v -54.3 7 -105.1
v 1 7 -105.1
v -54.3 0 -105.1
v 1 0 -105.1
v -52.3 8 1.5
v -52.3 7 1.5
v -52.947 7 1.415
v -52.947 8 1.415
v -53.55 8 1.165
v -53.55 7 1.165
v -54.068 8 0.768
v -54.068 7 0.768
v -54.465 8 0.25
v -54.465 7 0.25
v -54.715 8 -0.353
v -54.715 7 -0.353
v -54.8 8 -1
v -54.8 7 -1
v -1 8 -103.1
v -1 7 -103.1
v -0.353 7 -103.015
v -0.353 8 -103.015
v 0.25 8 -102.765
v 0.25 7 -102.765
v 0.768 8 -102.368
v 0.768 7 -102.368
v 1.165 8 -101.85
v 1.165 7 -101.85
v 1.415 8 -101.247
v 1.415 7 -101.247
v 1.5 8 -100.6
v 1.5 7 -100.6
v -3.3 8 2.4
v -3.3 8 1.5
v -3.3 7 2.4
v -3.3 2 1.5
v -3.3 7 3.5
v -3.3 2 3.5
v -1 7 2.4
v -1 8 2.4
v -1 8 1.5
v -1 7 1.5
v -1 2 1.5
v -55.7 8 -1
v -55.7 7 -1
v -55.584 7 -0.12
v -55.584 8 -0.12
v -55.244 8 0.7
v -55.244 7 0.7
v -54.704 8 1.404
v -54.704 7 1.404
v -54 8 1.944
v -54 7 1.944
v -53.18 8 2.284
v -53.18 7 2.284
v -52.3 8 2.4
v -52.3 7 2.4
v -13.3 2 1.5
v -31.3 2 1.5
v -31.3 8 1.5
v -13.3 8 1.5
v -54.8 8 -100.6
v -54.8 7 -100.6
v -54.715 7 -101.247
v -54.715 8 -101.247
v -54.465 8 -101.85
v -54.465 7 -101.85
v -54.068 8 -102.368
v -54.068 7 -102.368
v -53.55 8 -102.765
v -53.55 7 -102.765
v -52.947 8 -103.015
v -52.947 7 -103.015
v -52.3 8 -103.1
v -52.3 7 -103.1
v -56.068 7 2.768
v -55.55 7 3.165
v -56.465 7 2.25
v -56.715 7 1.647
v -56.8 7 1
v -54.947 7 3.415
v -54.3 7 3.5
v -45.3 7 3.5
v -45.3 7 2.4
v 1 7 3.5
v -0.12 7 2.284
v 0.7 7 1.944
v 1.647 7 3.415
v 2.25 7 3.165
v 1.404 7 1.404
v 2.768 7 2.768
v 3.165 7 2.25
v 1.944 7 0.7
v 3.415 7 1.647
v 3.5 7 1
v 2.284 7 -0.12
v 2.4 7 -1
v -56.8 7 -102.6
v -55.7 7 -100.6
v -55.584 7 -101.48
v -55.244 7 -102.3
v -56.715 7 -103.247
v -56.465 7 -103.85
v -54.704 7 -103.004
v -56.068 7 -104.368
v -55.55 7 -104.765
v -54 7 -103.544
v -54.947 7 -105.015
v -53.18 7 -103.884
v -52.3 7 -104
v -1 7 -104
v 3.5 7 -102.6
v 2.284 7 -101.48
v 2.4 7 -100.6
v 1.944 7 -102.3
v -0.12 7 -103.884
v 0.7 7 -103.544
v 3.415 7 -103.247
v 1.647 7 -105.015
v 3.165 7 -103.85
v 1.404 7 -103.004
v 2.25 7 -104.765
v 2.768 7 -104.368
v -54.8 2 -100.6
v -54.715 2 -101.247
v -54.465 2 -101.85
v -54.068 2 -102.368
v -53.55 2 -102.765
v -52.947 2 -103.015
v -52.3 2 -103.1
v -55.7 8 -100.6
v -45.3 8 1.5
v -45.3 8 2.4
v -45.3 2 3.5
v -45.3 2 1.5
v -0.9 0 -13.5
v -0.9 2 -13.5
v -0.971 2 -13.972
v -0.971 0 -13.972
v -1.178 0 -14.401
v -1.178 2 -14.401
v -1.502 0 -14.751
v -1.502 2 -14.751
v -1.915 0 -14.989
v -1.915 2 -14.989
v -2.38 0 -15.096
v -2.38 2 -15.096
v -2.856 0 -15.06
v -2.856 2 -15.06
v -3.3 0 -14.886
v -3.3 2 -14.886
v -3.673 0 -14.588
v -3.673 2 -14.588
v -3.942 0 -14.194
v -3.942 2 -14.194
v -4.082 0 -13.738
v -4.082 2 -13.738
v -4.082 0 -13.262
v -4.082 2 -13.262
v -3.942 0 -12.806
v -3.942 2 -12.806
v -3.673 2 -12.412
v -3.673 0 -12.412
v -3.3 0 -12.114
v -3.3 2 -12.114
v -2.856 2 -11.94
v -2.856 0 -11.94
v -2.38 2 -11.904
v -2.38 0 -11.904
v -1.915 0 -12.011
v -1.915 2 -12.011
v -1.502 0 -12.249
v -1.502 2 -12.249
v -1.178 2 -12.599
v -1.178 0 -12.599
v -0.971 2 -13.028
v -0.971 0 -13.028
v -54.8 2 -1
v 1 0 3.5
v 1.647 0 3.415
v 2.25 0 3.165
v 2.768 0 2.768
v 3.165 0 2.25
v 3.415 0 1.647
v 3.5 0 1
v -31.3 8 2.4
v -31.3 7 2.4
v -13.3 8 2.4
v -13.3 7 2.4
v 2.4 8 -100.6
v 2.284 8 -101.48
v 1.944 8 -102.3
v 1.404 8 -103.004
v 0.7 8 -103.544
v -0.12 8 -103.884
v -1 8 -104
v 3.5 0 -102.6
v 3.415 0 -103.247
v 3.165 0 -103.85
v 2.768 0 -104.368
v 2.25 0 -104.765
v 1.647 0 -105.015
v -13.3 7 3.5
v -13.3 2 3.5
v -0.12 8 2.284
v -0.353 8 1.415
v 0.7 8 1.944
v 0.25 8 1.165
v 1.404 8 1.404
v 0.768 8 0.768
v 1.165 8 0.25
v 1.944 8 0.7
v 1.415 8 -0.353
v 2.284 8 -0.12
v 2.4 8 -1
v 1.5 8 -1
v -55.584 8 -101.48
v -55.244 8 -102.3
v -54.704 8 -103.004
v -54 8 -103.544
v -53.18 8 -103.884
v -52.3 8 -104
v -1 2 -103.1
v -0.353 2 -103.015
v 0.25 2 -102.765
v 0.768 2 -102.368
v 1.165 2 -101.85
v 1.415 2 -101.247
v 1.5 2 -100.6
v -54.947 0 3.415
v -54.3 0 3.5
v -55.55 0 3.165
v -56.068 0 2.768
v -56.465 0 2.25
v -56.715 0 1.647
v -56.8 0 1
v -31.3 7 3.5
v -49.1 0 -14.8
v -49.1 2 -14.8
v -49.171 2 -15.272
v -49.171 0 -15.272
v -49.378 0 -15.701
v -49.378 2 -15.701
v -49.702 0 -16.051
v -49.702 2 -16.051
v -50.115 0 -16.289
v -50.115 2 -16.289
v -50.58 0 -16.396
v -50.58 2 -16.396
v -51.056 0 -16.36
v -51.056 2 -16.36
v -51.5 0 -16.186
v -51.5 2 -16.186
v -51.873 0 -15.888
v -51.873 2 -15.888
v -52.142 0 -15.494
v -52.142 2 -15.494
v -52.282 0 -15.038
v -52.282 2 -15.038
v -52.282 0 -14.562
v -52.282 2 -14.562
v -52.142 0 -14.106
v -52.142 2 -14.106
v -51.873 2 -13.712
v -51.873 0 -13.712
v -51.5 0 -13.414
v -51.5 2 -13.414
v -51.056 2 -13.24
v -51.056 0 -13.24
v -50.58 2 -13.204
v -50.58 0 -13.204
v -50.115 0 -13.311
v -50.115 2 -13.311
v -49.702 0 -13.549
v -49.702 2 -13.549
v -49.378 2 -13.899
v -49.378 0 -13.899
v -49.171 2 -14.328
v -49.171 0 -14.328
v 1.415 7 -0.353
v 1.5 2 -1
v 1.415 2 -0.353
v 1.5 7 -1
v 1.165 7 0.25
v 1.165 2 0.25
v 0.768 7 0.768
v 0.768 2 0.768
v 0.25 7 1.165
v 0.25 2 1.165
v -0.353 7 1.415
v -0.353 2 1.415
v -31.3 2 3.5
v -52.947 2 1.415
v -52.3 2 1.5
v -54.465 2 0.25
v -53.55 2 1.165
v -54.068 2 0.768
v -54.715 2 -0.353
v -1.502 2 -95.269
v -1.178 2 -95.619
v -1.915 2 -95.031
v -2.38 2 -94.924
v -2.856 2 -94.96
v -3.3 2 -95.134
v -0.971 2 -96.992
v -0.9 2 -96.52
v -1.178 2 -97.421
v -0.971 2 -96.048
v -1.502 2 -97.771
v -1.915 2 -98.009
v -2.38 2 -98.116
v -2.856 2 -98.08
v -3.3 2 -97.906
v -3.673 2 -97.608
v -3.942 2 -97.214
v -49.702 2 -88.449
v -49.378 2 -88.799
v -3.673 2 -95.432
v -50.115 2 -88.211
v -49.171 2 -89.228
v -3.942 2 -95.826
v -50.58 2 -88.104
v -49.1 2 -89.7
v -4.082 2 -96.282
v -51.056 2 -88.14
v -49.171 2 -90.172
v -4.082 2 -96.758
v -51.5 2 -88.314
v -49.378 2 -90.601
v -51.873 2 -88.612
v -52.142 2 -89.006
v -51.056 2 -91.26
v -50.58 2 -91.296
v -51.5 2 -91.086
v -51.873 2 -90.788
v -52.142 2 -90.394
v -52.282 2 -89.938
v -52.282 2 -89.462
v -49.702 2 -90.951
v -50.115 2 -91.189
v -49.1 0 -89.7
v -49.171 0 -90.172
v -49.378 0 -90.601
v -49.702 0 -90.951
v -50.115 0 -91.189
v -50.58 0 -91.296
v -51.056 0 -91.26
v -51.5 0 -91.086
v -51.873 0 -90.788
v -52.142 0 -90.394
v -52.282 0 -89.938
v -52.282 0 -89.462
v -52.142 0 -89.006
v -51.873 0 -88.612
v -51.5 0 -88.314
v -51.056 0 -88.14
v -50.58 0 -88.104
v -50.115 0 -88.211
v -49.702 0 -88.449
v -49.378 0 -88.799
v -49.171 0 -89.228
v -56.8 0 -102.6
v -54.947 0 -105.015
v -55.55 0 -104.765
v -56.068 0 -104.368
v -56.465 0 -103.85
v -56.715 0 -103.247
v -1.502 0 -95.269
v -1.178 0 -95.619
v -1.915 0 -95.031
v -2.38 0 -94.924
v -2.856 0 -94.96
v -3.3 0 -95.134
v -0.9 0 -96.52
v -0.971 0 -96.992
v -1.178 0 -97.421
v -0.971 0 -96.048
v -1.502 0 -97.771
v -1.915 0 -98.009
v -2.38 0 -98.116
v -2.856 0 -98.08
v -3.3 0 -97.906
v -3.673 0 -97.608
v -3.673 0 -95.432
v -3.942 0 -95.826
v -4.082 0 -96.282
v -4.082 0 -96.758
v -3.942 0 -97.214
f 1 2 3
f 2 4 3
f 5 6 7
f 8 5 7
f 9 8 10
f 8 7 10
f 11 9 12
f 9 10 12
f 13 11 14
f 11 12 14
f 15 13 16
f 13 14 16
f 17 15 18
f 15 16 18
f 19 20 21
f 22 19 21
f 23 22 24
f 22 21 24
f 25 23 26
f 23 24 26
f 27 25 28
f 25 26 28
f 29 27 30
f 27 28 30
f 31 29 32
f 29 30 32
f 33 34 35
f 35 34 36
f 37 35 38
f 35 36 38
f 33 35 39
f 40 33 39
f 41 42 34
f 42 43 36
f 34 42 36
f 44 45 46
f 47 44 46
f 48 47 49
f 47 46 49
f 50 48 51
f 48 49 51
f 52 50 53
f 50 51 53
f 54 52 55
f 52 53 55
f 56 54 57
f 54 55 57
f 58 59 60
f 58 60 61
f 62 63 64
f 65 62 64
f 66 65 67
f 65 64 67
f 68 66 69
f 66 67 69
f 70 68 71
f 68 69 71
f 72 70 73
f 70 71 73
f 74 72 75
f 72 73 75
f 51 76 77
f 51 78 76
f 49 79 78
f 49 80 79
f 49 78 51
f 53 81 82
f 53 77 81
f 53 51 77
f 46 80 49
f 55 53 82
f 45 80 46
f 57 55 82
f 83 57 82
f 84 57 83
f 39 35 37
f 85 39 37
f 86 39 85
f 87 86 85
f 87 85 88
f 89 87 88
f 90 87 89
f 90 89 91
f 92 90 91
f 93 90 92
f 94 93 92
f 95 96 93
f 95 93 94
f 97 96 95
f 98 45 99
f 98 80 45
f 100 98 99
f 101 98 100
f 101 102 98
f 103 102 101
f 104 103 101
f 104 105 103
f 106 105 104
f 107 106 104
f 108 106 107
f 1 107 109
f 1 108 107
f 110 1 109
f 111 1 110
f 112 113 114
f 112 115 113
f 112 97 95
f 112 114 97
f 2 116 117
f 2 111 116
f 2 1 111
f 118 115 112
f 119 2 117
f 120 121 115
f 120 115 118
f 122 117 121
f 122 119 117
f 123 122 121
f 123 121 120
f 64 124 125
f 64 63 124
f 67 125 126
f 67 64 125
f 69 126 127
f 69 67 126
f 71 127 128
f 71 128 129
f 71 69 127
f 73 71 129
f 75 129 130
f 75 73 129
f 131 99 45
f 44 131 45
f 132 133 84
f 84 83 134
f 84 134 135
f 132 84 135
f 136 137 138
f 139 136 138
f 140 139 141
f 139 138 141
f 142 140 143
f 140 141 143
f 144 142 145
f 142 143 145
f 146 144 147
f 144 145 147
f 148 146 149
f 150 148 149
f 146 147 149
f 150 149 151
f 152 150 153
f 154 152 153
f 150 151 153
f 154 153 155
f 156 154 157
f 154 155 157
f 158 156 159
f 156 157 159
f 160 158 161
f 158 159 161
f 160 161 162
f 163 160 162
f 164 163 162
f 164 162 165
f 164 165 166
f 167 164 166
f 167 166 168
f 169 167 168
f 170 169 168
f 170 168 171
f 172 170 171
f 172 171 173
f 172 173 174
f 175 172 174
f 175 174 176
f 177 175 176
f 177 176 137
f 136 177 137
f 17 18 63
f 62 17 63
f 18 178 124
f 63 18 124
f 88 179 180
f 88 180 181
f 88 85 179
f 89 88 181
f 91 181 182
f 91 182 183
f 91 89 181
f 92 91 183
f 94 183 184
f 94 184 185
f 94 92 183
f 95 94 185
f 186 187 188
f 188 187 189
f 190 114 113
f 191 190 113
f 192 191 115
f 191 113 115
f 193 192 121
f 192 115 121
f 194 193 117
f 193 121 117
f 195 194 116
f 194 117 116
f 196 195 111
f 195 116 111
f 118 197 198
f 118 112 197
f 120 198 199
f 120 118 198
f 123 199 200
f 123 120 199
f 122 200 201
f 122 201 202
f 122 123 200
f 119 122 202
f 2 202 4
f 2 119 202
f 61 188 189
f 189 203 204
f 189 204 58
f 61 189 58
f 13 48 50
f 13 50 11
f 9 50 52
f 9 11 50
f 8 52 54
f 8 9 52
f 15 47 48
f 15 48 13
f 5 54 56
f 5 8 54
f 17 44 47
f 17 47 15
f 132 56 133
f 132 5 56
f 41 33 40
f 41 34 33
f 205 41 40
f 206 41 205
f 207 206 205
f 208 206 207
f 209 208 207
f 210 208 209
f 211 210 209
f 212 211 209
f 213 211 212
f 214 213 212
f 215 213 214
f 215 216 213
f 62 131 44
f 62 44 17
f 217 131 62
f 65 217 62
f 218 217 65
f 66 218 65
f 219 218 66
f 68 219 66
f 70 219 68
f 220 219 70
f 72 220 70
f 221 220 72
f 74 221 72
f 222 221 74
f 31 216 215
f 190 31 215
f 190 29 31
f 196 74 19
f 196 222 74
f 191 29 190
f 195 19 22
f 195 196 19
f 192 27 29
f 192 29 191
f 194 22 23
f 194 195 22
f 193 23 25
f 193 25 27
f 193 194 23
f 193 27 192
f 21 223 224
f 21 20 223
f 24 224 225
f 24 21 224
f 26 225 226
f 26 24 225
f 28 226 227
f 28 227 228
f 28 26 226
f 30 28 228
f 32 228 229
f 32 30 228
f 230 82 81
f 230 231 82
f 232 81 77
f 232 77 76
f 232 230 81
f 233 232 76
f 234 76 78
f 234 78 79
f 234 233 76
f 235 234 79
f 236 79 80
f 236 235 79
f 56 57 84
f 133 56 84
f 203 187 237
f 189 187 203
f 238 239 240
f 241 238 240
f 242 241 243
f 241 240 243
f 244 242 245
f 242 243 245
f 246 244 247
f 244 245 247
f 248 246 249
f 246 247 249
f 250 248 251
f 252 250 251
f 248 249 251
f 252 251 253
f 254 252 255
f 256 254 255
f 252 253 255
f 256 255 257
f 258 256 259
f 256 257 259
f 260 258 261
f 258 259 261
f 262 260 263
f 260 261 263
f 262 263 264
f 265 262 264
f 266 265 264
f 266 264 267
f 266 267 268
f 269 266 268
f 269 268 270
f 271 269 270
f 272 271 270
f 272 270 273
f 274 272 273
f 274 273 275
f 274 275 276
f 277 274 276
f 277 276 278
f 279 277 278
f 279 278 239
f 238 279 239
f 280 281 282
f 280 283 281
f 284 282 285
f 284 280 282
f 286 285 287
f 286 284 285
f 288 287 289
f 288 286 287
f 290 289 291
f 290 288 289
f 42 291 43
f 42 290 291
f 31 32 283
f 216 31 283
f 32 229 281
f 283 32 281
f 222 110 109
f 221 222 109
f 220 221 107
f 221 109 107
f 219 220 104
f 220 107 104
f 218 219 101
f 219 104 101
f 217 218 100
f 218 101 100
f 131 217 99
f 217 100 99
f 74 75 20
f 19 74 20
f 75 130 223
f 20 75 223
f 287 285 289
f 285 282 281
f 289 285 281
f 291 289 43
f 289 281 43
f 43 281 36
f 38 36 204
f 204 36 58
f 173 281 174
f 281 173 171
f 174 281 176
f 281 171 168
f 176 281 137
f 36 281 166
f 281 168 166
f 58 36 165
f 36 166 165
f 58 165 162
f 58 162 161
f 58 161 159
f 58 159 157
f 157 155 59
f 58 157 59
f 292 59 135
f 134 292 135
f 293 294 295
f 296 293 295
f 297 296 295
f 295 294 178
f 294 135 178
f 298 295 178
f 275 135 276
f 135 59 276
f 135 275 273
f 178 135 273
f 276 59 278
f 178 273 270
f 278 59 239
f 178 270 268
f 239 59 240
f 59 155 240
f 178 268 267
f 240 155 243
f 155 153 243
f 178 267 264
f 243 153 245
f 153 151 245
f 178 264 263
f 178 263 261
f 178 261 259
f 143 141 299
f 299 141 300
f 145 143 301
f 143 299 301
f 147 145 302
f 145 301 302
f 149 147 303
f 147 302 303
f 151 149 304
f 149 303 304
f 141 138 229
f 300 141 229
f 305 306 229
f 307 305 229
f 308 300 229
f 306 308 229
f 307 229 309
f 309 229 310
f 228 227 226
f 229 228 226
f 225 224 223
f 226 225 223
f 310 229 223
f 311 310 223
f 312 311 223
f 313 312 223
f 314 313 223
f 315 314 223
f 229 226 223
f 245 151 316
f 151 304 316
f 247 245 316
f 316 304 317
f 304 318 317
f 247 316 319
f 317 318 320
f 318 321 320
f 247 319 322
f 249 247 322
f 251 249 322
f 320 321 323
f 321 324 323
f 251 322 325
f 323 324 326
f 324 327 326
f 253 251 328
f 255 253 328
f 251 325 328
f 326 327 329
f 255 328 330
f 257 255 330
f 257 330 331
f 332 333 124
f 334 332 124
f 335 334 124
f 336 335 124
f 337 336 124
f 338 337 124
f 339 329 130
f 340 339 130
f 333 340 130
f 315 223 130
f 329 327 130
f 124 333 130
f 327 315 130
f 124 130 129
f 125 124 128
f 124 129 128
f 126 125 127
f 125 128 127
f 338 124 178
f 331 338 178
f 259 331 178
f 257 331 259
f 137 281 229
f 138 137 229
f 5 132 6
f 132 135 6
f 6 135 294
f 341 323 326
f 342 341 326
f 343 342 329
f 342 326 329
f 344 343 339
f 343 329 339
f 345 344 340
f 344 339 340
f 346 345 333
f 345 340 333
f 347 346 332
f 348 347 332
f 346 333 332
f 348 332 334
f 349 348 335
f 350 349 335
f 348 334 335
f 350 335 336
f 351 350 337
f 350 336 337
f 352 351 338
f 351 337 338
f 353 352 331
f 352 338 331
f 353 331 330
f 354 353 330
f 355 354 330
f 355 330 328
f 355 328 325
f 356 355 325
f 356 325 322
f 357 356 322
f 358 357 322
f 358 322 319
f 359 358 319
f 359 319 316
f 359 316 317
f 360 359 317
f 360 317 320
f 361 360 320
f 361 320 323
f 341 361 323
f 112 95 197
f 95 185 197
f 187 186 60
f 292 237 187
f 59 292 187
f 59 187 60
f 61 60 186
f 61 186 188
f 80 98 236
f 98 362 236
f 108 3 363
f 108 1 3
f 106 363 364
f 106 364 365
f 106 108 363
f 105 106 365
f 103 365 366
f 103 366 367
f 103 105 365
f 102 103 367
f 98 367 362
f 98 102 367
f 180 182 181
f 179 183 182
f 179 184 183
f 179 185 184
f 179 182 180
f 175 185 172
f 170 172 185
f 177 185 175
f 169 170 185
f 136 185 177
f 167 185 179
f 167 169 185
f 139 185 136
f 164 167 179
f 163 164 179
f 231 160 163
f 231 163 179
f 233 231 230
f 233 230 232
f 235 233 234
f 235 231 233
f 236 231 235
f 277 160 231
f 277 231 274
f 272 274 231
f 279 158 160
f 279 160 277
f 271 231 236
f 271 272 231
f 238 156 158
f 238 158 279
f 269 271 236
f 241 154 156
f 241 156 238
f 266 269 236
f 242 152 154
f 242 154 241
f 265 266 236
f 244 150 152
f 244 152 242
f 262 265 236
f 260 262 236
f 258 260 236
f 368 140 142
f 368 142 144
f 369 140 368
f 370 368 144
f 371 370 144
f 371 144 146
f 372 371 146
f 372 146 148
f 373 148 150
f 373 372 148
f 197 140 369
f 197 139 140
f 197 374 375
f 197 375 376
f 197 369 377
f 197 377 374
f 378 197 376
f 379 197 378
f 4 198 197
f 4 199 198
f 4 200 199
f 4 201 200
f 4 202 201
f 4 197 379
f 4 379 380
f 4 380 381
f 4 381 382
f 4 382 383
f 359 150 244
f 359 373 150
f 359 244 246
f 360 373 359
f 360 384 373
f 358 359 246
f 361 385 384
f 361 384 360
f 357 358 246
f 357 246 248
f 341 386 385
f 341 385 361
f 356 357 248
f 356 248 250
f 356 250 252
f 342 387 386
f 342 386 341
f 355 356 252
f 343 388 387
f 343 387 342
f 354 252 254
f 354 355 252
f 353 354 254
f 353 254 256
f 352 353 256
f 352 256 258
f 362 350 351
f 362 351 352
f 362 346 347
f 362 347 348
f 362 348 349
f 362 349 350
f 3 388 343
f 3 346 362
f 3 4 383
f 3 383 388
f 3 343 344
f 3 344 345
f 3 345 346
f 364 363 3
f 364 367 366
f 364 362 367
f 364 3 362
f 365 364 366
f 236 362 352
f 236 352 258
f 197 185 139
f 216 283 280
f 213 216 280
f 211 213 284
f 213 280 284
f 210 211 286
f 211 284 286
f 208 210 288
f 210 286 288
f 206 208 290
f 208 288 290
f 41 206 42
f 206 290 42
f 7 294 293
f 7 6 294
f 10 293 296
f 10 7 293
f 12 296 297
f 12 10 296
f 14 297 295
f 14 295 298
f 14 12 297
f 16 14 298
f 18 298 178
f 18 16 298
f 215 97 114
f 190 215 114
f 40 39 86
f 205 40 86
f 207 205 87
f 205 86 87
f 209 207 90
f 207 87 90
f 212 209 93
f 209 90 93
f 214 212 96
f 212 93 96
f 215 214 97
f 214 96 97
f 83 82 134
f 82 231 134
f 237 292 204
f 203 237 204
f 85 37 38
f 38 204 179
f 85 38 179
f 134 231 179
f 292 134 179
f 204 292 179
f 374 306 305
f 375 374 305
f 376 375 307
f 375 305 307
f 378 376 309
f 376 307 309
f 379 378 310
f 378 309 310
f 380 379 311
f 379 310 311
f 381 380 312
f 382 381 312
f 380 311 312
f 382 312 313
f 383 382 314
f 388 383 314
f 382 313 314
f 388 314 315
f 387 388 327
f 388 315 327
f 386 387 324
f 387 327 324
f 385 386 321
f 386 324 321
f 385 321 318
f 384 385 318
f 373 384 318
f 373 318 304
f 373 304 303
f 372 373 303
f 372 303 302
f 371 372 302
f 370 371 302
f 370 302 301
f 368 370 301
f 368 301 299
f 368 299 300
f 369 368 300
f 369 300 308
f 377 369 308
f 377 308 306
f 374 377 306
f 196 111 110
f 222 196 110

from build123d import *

# Parameters (mm, degrees)
BOSS_EXTRUDE1_DEPTH = 2
SKETCH5_W           = 18
SKETCH5_H           = 2
BOSS_EXTRUDE2_DEPTH = 5
CUT_EXTRUDE1_REACH  = 4
SKETCH6_R           = 1.6
FILLET1_R           = 2.5
SKETCH7_W           = 18
SKETCH7_H           = 0.9
BOSS_EXTRUDE3_DEPTH = 1


with BuildPart() as part:
    # Sketch4 → Boss-Extrude1 (new body)
    with BuildSketch(Plane(origin=(0, 0, 0), x_dir=(1, 0, 0), z_dir=(0, 1, 0))):
        Polygon((-56.8, -3.5), (-56.8, 105.1), (3.5, 105.1), (3.5, -3.5), (-2.3, -3.5), (-14.3, -3.5), (-30.8, -3.5), (-45.8, -3.5), align=None)
    extrude(amount=BOSS_EXTRUDE1_DEPTH)

    # Sketch5 → Boss-Extrude2 (add)
    with BuildSketch(Plane(origin=(0, 2, 0), x_dir=(1, 0, 0), z_dir=(0, 1, 0))):
        Polygon((-45.3, -1.5), (-54.8, -1.5), (-54.8, 103.1), (1.5, 103.1), (1.5, -1.5), (-3.3, -1.5), (-3.3, -3.5), (3.5, -3.5), (3.5, 105.1), (-56.8, 105.1), (-56.8, -3.5), (-45.3, -3.5), align=None)
        with Locations((-22.3, -2.5)):
            Rectangle(SKETCH5_W, SKETCH5_H)
    extrude(amount=BOSS_EXTRUDE2_DEPTH)

    # Sketch6 → Cut-Extrude1 (cut, up to next)
    with BuildSketch(Plane(origin=(0, 2, 0), x_dir=(1, 0, 0), z_dir=(0, 1, 0)), mode=Mode.PRIVATE) as cut_extrude1_sk1:
        with Locations((-2.5, 96.52)):
            Circle(SKETCH6_R)
    cut_extrude1_tool1 = extrude(cut_extrude1_sk1.sketch, amount=-CUT_EXTRUDE1_REACH, mode=Mode.PRIVATE) & part.part
    add(cut_extrude1_tool1.solids().sort_by_distance((-2.5, 2, -96.52))[0], mode=Mode.SUBTRACT)
    # Sketch6 → Cut-Extrude1 (cut, up to next)
    with BuildSketch(Plane(origin=(0, 2, 0), x_dir=(1, 0, 0), z_dir=(0, 1, 0)), mode=Mode.PRIVATE) as cut_extrude1_sk2:
        with Locations((-50.7, 89.7)):
            Circle(SKETCH6_R)
    cut_extrude1_tool2 = extrude(cut_extrude1_sk2.sketch, amount=-CUT_EXTRUDE1_REACH, mode=Mode.PRIVATE) & part.part
    add(cut_extrude1_tool2.solids().sort_by_distance((-50.7, 2, -89.7))[0], mode=Mode.SUBTRACT)
    # Sketch6 → Cut-Extrude1 (cut, up to next)
    with BuildSketch(Plane(origin=(0, 2, 0), x_dir=(1, 0, 0), z_dir=(0, 1, 0)), mode=Mode.PRIVATE) as cut_extrude1_sk3:
        with Locations((-2.5, 13.5)):
            Circle(SKETCH6_R)
    cut_extrude1_tool3 = extrude(cut_extrude1_sk3.sketch, amount=-CUT_EXTRUDE1_REACH, mode=Mode.PRIVATE) & part.part
    add(cut_extrude1_tool3.solids().sort_by_distance((-2.5, 2, -13.5))[0], mode=Mode.SUBTRACT)
    # Sketch6 → Cut-Extrude1 (cut, up to next)
    with BuildSketch(Plane(origin=(0, 2, 0), x_dir=(1, 0, 0), z_dir=(0, 1, 0)), mode=Mode.PRIVATE) as cut_extrude1_sk4:
        with Locations((-50.7, 14.8)):
            Circle(SKETCH6_R)
    cut_extrude1_tool4 = extrude(cut_extrude1_sk4.sketch, amount=-CUT_EXTRUDE1_REACH, mode=Mode.PRIVATE) & part.part
    add(cut_extrude1_tool4.solids().sort_by_distance((-50.7, 2, -14.8))[0], mode=Mode.SUBTRACT)

    # Fillet1
    fillet1_edges = [part.edges().sort_by_distance(p)[0] for p in [
        (3.5, 3.5, 3.5),
        (3.5, 3.5, -105.1),
        (-56.8, 3.5, -105.1),
        (-56.8, 3.5, 3.5),
        (1.5, 4.5, 1.5),
        (-54.8, 4.5, 1.5),
        (-54.8, 4.5, -103.1),
        (1.5, 4.5, -103.1),
    ]]
    fillet(fillet1_edges, radius=FILLET1_R)

    # Sketch7 → Boss-Extrude3 (add)
    with BuildSketch(Plane(origin=(0, 7, 0), x_dir=(1, 0, 0), z_dir=(0, 1, 0))):
        with BuildLine():
            Line((-3.3, -2.4), (-1, -2.4))
            ThreePointArc((-1, -2.4), (1.404163056, -1.404163056), (2.4, 1))
            Line((2.4, 1), (2.4, 100.6))
            ThreePointArc((2.4, 100.6), (1.404163056, 103.004163056), (-1, 104))
            Line((-1, 104), (-52.3, 104))
            ThreePointArc((-52.3, 104), (-54.704163056, 103.004163056), (-55.7, 100.6))
            Line((-55.7, 100.6), (-55.7, 1))
            ThreePointArc((-55.7, 1), (-54.704163056, -1.404163056), (-52.3, -2.4))
            Line((-52.3, -2.4), (-45.3, -2.4))
            Line((-45.3, -2.4), (-45.3, -1.5))
            Line((-45.3, -1.5), (-52.3, -1.5))
            ThreePointArc((-52.3, -1.5), (-54.067766953, -0.767766953), (-54.8, 1))
            Line((-54.8, 1), (-54.8, 100.6))
            ThreePointArc((-54.8, 100.6), (-54.067766953, 102.367766953), (-52.3, 103.1))
            Line((-52.3, 103.1), (-1, 103.1))
            ThreePointArc((-1, 103.1), (0.767766953, 102.367766953), (1.5, 100.6))
            Line((1.5, 100.6), (1.5, 1))
            ThreePointArc((1.5, 1), (0.767766953, -0.767766953), (-1, -1.5))
            Line((-1, -1.5), (-3.3, -1.5))
            Line((-3.3, -1.5), (-3.3, -2.4))
        make_face()
        with Locations((-22.3, -1.95)):
            Rectangle(SKETCH7_W, SKETCH7_H)
    extrude(amount=BOSS_EXTRUDE3_DEPTH)


solid = part.part
